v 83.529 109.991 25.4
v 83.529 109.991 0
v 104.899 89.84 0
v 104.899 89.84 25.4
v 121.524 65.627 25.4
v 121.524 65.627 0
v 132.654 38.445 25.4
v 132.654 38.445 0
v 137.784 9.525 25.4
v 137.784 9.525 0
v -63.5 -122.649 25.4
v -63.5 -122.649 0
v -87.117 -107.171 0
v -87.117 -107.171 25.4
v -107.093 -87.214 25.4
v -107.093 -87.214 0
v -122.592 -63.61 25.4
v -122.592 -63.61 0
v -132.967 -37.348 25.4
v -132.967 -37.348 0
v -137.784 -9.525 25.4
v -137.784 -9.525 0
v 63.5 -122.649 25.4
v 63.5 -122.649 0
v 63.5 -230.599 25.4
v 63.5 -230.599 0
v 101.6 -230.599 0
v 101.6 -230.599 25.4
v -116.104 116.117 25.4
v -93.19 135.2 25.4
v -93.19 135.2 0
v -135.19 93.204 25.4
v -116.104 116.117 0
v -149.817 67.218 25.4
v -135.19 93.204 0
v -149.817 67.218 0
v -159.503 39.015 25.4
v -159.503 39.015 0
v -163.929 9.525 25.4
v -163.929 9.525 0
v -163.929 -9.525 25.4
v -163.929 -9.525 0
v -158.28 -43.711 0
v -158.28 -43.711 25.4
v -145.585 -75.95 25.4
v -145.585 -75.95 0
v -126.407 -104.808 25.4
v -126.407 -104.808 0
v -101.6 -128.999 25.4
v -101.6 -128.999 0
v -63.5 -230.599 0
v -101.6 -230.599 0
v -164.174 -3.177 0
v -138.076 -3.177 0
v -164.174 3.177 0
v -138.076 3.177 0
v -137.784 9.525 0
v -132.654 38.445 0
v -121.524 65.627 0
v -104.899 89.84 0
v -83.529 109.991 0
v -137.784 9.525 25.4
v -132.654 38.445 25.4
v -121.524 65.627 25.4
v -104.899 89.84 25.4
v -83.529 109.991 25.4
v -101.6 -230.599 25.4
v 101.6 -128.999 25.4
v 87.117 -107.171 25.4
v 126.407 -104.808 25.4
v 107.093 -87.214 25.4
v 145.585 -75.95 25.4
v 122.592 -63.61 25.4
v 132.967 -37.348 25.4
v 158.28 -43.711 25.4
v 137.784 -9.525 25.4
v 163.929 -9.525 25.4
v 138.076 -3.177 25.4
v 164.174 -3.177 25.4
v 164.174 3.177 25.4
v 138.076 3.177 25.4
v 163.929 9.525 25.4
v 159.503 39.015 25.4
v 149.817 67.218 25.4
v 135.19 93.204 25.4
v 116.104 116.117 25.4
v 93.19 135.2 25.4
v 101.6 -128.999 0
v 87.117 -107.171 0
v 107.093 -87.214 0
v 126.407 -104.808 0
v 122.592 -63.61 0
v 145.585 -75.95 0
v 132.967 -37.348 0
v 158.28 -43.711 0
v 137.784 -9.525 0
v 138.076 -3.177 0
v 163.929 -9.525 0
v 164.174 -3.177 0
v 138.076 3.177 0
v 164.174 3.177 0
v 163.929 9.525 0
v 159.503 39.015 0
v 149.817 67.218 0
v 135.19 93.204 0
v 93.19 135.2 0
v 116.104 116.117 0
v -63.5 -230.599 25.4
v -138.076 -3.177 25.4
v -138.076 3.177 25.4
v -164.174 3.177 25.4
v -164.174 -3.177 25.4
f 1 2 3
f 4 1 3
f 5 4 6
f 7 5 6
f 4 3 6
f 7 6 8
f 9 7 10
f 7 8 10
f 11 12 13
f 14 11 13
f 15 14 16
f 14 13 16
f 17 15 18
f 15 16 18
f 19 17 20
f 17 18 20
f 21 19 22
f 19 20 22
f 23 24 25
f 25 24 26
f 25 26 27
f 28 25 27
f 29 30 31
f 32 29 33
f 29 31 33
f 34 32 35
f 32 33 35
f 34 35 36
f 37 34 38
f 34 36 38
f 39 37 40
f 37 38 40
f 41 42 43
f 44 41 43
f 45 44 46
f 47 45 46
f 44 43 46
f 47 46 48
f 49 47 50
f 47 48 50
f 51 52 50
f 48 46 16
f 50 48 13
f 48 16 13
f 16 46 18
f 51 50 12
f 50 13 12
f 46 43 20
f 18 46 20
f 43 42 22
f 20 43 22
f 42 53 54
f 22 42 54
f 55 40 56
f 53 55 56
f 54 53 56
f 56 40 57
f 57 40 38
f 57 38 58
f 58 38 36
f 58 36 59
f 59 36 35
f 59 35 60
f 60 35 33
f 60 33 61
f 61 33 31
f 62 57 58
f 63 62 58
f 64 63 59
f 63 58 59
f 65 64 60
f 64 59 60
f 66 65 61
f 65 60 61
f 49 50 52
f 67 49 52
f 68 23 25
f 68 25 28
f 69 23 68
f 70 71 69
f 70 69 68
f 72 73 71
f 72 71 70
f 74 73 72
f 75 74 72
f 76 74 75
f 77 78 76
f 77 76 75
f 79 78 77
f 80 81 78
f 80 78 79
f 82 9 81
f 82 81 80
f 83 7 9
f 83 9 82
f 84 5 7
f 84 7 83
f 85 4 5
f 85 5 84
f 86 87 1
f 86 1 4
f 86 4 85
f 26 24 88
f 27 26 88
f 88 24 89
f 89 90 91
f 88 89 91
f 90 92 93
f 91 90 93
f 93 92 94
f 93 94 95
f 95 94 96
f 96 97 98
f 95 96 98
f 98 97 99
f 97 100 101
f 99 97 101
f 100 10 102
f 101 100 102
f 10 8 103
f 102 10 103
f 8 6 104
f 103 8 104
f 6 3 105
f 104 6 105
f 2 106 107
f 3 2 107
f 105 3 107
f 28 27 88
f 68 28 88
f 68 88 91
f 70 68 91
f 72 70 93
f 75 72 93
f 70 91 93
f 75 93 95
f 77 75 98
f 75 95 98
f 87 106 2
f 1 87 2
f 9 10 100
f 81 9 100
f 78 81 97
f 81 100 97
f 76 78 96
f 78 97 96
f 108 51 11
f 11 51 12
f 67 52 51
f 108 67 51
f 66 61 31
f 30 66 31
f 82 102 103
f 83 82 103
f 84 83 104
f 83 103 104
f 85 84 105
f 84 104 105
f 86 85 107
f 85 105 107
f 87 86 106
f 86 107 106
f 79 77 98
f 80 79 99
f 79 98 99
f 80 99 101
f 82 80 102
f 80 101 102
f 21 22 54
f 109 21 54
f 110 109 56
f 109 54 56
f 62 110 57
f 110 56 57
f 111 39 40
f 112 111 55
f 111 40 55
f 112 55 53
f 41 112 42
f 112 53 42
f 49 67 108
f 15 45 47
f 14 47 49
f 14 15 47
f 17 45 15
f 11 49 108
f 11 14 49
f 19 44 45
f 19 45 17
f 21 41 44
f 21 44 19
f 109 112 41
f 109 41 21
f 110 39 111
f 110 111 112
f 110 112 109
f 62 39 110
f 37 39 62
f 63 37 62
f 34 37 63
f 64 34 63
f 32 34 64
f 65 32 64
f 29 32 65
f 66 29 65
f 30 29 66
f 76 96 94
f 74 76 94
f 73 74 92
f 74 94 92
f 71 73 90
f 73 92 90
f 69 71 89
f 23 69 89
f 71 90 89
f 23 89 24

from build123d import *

# Parameters (mm, degrees)
F1_DEPTH = 25.4


with BuildPart() as f1:
    # F0 (on Top) → F1 (new body)
    with BuildSketch(Plane.XY):
        with BuildLine():
            Line((-63.5, -230.599143), (-63.5, -122.649145))
            ThreePointArc((-63.5, -122.649145), (-115.447157, -75.80908), (-137.78366, -9.525))
            Line((-137.78366, -9.525), (-163.928683, -9.525))
            ThreePointArc((-163.928683, -9.525), (-145.584642, -75.950317), (-101.6, -128.999143))
            Line((-101.6, -128.999143), (-101.6, -230.599143))
            Line((-101.6, -230.599143), (-63.5, -230.599143))
        make_face()
        with BuildLine():
            Line((-163.928683, -9.525), (-137.78366, -9.525))
            ThreePointArc((-137.78366, -9.525), (-138.1125, 0), (-137.78366, 9.525))
            Line((-137.78366, 9.525), (-163.928683, 9.525))
            Line((-163.928683, 9.525), (-163.928683, -9.525))
        make_face()
        with BuildLine():
            Line((-163.928683, 9.525), (-137.78366, 9.525))
            ThreePointArc((-137.78366, 9.525), (-121.524353, 65.626932), (-83.529033, 109.990742))
            Line((-83.529033, 109.990742), (-93.189989, 135.199722))
            ThreePointArc((-93.189989, 135.199722), (-143.094503, 80.54379), (-163.928683, 9.525))
        make_face()
        with BuildLine():
            ThreePointArc((-163.928683, 9.525), (-164.205173, 0), (-163.928683, -9.525))
            Line((-163.928683, -9.525), (-163.928683, 9.525))
        make_face()
        with BuildLine():
            ThreePointArc((163.928683, 9.525), (143.094503, 80.54379), (93.189989, 135.199722))
            Line((93.189989, 135.199722), (83.529033, 109.990742))
            ThreePointArc((83.529033, 109.990742), (121.524353, 65.626932), (137.78366, 9.525))
            Line((137.78366, 9.525), (163.928683, 9.525))
        make_face()
        with BuildLine():
            Line((163.928683, -9.525), (163.928683, 9.525))
            Line((163.928683, 9.525), (137.78366, 9.525))
            ThreePointArc((137.78366, 9.525), (138.1125, 0), (137.78366, -9.525))
            Line((137.78366, -9.525), (163.928683, -9.525))
        make_face()
        with BuildLine():
            ThreePointArc((163.928683, -9.525), (164.205173, 0), (163.928683, 9.525))
            Line((163.928683, 9.525), (163.928683, -9.525))
        make_face()
        with BuildLine():
            ThreePointArc((101.6, -128.999143), (145.584642, -75.950317), (163.928683, -9.525))
            Line((163.928683, -9.525), (137.78366, -9.525))
            ThreePointArc((137.78366, -9.525), (115.447157, -75.80908), (63.5, -122.649145))
            Line((63.5, -122.649145), (63.5, -230.599143))
            Line((63.5, -230.599143), (101.6, -230.599143))
            Line((101.6, -230.599143), (101.6, -128.999143))
        make_face()
    extrude(amount=F1_DEPTH)


solid = f1.part
